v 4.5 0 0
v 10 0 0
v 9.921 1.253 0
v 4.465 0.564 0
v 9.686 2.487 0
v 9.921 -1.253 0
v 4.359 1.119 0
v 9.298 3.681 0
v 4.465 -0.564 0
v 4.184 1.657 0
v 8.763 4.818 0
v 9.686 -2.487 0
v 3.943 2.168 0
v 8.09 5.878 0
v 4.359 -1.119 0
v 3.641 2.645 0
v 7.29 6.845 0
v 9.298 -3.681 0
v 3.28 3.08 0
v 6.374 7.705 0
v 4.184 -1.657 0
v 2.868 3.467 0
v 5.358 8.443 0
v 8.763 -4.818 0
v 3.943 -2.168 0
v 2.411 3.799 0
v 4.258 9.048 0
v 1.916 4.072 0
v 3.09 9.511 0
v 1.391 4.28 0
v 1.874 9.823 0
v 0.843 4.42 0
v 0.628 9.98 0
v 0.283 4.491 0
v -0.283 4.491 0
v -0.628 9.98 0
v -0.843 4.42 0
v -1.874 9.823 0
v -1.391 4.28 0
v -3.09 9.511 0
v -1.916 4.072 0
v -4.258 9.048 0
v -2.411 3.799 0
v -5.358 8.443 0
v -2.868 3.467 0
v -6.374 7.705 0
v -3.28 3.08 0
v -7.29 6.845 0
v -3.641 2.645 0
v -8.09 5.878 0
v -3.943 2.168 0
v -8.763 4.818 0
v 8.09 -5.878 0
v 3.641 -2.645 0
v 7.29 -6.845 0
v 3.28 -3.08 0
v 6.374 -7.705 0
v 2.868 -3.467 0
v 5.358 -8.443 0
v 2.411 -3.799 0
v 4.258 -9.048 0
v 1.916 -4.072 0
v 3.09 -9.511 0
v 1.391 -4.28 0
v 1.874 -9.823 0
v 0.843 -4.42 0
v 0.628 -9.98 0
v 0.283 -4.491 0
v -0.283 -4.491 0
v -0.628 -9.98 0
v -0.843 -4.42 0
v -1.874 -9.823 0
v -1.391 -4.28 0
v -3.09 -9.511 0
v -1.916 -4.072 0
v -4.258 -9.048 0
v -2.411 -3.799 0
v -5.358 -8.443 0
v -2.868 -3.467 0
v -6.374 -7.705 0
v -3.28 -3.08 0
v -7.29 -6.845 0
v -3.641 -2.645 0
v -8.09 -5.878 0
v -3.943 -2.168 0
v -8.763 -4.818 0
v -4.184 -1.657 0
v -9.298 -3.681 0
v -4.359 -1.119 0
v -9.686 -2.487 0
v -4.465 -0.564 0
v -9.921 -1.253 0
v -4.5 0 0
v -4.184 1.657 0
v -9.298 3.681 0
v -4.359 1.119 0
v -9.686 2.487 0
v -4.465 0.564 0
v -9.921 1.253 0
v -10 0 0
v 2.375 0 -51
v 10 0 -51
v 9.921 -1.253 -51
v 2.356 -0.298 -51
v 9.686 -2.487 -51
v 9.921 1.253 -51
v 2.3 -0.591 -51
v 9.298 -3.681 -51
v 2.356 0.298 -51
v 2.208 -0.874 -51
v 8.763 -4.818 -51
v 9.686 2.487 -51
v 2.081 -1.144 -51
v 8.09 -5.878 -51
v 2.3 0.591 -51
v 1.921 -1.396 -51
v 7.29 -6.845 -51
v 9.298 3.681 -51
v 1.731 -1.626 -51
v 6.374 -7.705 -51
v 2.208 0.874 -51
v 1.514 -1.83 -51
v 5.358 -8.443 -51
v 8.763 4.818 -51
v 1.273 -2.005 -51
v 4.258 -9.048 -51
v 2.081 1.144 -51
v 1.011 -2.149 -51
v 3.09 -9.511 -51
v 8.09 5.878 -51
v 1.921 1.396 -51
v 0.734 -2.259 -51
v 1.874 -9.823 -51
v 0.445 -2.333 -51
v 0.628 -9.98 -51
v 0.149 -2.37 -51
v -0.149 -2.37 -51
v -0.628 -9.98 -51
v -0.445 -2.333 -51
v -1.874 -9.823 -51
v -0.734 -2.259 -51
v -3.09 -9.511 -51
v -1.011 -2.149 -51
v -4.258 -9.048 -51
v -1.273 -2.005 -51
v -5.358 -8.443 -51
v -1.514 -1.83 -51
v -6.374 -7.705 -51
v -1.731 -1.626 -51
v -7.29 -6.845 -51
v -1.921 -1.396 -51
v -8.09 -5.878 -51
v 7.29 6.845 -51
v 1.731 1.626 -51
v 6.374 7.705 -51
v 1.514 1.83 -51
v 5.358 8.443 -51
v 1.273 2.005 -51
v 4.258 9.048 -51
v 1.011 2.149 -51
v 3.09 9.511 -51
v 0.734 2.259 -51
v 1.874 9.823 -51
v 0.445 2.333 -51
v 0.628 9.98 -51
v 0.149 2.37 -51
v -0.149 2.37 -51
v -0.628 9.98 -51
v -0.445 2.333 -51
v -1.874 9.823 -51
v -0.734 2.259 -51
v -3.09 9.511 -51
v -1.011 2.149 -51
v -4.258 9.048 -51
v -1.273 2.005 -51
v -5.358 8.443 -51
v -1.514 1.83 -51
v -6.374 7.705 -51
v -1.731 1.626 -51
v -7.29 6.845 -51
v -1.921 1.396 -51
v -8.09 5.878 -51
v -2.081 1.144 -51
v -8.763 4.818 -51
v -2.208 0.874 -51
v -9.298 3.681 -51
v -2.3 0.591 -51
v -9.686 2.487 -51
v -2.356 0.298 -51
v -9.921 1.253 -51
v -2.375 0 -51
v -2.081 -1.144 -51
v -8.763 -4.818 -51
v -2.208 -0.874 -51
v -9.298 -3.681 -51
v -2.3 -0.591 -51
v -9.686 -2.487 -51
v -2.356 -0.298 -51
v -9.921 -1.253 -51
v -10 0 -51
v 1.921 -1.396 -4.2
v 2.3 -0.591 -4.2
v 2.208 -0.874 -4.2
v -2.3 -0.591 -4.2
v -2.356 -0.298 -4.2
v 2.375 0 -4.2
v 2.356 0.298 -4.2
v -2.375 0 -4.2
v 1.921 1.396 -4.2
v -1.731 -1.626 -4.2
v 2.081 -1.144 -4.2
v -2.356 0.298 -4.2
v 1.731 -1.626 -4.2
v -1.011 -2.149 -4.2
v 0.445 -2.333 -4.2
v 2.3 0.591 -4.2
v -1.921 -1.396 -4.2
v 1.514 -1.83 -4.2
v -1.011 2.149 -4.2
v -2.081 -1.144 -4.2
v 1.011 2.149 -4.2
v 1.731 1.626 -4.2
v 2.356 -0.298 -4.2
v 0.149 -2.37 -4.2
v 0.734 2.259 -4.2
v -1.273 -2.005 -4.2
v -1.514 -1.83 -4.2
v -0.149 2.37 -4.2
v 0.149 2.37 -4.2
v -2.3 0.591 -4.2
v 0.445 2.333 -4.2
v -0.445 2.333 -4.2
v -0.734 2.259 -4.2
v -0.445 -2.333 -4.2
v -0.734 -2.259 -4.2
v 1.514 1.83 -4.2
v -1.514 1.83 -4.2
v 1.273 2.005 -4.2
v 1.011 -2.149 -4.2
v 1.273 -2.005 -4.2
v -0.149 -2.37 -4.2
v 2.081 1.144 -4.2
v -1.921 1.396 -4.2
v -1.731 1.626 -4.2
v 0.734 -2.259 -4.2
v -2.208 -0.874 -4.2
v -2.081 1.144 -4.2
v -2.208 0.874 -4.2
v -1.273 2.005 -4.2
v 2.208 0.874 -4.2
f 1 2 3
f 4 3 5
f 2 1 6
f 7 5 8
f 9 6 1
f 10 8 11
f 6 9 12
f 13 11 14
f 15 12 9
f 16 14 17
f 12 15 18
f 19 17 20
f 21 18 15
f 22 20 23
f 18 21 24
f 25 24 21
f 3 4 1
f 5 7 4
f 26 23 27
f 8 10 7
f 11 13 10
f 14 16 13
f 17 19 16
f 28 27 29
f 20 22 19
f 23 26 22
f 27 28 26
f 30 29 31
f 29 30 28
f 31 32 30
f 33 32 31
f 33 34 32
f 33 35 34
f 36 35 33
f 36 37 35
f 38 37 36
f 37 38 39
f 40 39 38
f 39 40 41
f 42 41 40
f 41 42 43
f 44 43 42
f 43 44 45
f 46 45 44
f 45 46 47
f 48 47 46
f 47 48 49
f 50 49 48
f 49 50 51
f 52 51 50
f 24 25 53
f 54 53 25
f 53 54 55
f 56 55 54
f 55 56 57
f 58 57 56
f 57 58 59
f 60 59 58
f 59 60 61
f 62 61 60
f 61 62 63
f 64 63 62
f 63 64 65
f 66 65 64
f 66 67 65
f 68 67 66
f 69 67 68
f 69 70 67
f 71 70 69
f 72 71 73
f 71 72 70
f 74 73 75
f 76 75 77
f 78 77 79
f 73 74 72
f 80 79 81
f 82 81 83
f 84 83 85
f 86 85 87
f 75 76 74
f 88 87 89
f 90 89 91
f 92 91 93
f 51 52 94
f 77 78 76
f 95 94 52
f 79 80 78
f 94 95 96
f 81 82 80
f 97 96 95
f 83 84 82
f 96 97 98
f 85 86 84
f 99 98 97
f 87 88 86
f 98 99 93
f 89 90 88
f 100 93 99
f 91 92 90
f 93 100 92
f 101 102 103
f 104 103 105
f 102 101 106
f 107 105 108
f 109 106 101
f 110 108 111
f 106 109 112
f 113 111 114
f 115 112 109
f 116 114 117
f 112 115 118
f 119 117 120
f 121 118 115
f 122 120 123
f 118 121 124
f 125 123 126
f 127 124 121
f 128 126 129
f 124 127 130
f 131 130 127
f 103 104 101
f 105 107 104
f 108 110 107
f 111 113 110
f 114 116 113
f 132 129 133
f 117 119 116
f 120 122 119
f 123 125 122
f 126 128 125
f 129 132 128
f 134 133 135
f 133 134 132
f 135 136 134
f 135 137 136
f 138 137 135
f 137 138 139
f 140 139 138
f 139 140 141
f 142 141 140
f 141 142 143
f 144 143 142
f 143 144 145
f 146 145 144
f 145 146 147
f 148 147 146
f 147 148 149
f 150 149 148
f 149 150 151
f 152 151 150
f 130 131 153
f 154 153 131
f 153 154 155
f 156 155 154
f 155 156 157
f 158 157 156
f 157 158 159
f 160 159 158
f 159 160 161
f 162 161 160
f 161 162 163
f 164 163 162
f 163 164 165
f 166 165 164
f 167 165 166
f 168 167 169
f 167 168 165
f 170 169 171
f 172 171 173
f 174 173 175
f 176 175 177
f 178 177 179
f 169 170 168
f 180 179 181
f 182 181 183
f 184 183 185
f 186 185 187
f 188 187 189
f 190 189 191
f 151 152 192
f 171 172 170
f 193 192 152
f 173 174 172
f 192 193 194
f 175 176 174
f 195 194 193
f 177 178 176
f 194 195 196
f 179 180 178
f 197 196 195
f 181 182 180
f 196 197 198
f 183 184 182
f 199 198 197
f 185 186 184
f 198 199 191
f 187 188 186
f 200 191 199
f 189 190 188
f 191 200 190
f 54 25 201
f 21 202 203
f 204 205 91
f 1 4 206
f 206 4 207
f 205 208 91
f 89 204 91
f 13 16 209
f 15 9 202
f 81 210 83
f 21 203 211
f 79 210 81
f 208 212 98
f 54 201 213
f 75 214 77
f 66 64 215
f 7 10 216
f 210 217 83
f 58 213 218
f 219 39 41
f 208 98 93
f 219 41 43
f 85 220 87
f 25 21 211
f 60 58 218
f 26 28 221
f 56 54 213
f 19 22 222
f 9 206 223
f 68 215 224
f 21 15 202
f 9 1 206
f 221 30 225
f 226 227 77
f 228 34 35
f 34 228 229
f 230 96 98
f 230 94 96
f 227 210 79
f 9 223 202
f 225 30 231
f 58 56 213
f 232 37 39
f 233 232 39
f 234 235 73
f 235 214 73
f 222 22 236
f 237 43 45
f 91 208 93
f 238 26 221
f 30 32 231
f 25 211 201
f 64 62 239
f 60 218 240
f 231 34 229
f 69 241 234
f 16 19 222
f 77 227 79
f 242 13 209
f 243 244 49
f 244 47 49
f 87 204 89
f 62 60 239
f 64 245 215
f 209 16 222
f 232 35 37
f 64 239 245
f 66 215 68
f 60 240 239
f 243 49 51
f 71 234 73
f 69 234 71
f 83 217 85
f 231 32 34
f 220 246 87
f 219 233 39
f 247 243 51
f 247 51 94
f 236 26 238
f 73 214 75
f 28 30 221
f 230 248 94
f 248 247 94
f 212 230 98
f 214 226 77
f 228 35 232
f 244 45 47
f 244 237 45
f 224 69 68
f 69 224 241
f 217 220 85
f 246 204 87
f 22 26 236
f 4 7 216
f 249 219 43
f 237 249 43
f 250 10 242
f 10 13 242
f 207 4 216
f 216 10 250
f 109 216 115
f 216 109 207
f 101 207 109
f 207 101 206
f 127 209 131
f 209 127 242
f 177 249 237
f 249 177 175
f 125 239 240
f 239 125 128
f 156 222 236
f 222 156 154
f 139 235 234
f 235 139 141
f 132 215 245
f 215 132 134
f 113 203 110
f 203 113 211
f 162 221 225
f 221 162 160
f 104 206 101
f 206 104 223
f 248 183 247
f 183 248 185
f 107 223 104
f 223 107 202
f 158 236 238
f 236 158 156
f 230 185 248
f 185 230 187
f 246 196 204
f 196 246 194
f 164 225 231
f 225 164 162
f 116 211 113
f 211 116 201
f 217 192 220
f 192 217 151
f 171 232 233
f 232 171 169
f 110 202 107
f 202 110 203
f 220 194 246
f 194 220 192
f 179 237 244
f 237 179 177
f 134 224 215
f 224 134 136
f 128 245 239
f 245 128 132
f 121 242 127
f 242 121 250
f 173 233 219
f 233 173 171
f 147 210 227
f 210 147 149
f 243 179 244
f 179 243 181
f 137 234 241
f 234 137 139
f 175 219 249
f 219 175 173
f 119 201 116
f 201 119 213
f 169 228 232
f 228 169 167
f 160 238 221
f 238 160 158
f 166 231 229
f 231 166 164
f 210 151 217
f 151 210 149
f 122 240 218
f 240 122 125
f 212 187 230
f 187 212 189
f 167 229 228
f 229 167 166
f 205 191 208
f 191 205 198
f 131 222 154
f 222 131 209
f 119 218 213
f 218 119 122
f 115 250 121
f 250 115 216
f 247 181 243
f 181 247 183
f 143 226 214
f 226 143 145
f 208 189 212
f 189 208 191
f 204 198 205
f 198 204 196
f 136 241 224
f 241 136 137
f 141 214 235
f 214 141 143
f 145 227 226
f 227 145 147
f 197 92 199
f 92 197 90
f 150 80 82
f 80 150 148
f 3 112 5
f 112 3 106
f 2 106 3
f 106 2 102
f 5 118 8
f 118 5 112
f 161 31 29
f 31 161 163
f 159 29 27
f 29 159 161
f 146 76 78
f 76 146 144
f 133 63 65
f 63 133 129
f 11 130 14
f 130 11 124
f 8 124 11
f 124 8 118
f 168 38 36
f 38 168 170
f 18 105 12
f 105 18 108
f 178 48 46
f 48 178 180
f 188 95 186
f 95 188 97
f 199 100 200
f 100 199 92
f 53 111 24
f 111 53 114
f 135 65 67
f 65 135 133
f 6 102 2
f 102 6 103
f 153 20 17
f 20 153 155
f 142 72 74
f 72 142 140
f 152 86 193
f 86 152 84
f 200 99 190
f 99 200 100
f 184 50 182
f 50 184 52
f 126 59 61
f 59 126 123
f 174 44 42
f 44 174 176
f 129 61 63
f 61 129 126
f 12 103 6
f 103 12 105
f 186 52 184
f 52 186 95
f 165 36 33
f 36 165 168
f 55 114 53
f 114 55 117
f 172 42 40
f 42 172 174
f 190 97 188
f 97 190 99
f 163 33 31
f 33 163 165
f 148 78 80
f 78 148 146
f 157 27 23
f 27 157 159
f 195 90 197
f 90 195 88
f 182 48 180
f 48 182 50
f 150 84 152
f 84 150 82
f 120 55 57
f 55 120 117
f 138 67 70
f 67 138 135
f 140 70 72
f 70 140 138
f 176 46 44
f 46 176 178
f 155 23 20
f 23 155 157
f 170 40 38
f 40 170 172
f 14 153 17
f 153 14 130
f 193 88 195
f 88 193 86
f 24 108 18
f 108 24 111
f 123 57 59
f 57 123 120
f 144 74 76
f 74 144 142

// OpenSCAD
$fn = 50;


difference() {
	union() {
		translate(v = [0, 0, -51.0000000000]) {
			cylinder(h = 51, r = 10.0000000000);
		}
		cylinder(h = 0, r = 19.0000000000);
	}
	union() {
		translate(v = [0, 0, 0]) {
			rotate(a = [0, 0, 0]) {
				difference() {
					union() {
						#translate(v = [0, 0, -51.0000000000]) {
							cylinder(h = 51, r = 2.2500000000);
						}
						#translate(v = [0, 0, -4.2000000000]) {
							cylinder(h = 4.2000000000, r = 10.0000000000, r1 = 2.3750000000, r2 = 4.5000000000);
						}
						#translate(v = [0, 0, -51.0000000000]) {
							cylinder(h = 51, r = 2.3750000000);
						}
						#translate(v = [0, 0, -51.0000000000]) {
							cylinder(h = 51, r = 2.2500000000);
						}
					}
					union();
				}
			}
		}
	}
}
